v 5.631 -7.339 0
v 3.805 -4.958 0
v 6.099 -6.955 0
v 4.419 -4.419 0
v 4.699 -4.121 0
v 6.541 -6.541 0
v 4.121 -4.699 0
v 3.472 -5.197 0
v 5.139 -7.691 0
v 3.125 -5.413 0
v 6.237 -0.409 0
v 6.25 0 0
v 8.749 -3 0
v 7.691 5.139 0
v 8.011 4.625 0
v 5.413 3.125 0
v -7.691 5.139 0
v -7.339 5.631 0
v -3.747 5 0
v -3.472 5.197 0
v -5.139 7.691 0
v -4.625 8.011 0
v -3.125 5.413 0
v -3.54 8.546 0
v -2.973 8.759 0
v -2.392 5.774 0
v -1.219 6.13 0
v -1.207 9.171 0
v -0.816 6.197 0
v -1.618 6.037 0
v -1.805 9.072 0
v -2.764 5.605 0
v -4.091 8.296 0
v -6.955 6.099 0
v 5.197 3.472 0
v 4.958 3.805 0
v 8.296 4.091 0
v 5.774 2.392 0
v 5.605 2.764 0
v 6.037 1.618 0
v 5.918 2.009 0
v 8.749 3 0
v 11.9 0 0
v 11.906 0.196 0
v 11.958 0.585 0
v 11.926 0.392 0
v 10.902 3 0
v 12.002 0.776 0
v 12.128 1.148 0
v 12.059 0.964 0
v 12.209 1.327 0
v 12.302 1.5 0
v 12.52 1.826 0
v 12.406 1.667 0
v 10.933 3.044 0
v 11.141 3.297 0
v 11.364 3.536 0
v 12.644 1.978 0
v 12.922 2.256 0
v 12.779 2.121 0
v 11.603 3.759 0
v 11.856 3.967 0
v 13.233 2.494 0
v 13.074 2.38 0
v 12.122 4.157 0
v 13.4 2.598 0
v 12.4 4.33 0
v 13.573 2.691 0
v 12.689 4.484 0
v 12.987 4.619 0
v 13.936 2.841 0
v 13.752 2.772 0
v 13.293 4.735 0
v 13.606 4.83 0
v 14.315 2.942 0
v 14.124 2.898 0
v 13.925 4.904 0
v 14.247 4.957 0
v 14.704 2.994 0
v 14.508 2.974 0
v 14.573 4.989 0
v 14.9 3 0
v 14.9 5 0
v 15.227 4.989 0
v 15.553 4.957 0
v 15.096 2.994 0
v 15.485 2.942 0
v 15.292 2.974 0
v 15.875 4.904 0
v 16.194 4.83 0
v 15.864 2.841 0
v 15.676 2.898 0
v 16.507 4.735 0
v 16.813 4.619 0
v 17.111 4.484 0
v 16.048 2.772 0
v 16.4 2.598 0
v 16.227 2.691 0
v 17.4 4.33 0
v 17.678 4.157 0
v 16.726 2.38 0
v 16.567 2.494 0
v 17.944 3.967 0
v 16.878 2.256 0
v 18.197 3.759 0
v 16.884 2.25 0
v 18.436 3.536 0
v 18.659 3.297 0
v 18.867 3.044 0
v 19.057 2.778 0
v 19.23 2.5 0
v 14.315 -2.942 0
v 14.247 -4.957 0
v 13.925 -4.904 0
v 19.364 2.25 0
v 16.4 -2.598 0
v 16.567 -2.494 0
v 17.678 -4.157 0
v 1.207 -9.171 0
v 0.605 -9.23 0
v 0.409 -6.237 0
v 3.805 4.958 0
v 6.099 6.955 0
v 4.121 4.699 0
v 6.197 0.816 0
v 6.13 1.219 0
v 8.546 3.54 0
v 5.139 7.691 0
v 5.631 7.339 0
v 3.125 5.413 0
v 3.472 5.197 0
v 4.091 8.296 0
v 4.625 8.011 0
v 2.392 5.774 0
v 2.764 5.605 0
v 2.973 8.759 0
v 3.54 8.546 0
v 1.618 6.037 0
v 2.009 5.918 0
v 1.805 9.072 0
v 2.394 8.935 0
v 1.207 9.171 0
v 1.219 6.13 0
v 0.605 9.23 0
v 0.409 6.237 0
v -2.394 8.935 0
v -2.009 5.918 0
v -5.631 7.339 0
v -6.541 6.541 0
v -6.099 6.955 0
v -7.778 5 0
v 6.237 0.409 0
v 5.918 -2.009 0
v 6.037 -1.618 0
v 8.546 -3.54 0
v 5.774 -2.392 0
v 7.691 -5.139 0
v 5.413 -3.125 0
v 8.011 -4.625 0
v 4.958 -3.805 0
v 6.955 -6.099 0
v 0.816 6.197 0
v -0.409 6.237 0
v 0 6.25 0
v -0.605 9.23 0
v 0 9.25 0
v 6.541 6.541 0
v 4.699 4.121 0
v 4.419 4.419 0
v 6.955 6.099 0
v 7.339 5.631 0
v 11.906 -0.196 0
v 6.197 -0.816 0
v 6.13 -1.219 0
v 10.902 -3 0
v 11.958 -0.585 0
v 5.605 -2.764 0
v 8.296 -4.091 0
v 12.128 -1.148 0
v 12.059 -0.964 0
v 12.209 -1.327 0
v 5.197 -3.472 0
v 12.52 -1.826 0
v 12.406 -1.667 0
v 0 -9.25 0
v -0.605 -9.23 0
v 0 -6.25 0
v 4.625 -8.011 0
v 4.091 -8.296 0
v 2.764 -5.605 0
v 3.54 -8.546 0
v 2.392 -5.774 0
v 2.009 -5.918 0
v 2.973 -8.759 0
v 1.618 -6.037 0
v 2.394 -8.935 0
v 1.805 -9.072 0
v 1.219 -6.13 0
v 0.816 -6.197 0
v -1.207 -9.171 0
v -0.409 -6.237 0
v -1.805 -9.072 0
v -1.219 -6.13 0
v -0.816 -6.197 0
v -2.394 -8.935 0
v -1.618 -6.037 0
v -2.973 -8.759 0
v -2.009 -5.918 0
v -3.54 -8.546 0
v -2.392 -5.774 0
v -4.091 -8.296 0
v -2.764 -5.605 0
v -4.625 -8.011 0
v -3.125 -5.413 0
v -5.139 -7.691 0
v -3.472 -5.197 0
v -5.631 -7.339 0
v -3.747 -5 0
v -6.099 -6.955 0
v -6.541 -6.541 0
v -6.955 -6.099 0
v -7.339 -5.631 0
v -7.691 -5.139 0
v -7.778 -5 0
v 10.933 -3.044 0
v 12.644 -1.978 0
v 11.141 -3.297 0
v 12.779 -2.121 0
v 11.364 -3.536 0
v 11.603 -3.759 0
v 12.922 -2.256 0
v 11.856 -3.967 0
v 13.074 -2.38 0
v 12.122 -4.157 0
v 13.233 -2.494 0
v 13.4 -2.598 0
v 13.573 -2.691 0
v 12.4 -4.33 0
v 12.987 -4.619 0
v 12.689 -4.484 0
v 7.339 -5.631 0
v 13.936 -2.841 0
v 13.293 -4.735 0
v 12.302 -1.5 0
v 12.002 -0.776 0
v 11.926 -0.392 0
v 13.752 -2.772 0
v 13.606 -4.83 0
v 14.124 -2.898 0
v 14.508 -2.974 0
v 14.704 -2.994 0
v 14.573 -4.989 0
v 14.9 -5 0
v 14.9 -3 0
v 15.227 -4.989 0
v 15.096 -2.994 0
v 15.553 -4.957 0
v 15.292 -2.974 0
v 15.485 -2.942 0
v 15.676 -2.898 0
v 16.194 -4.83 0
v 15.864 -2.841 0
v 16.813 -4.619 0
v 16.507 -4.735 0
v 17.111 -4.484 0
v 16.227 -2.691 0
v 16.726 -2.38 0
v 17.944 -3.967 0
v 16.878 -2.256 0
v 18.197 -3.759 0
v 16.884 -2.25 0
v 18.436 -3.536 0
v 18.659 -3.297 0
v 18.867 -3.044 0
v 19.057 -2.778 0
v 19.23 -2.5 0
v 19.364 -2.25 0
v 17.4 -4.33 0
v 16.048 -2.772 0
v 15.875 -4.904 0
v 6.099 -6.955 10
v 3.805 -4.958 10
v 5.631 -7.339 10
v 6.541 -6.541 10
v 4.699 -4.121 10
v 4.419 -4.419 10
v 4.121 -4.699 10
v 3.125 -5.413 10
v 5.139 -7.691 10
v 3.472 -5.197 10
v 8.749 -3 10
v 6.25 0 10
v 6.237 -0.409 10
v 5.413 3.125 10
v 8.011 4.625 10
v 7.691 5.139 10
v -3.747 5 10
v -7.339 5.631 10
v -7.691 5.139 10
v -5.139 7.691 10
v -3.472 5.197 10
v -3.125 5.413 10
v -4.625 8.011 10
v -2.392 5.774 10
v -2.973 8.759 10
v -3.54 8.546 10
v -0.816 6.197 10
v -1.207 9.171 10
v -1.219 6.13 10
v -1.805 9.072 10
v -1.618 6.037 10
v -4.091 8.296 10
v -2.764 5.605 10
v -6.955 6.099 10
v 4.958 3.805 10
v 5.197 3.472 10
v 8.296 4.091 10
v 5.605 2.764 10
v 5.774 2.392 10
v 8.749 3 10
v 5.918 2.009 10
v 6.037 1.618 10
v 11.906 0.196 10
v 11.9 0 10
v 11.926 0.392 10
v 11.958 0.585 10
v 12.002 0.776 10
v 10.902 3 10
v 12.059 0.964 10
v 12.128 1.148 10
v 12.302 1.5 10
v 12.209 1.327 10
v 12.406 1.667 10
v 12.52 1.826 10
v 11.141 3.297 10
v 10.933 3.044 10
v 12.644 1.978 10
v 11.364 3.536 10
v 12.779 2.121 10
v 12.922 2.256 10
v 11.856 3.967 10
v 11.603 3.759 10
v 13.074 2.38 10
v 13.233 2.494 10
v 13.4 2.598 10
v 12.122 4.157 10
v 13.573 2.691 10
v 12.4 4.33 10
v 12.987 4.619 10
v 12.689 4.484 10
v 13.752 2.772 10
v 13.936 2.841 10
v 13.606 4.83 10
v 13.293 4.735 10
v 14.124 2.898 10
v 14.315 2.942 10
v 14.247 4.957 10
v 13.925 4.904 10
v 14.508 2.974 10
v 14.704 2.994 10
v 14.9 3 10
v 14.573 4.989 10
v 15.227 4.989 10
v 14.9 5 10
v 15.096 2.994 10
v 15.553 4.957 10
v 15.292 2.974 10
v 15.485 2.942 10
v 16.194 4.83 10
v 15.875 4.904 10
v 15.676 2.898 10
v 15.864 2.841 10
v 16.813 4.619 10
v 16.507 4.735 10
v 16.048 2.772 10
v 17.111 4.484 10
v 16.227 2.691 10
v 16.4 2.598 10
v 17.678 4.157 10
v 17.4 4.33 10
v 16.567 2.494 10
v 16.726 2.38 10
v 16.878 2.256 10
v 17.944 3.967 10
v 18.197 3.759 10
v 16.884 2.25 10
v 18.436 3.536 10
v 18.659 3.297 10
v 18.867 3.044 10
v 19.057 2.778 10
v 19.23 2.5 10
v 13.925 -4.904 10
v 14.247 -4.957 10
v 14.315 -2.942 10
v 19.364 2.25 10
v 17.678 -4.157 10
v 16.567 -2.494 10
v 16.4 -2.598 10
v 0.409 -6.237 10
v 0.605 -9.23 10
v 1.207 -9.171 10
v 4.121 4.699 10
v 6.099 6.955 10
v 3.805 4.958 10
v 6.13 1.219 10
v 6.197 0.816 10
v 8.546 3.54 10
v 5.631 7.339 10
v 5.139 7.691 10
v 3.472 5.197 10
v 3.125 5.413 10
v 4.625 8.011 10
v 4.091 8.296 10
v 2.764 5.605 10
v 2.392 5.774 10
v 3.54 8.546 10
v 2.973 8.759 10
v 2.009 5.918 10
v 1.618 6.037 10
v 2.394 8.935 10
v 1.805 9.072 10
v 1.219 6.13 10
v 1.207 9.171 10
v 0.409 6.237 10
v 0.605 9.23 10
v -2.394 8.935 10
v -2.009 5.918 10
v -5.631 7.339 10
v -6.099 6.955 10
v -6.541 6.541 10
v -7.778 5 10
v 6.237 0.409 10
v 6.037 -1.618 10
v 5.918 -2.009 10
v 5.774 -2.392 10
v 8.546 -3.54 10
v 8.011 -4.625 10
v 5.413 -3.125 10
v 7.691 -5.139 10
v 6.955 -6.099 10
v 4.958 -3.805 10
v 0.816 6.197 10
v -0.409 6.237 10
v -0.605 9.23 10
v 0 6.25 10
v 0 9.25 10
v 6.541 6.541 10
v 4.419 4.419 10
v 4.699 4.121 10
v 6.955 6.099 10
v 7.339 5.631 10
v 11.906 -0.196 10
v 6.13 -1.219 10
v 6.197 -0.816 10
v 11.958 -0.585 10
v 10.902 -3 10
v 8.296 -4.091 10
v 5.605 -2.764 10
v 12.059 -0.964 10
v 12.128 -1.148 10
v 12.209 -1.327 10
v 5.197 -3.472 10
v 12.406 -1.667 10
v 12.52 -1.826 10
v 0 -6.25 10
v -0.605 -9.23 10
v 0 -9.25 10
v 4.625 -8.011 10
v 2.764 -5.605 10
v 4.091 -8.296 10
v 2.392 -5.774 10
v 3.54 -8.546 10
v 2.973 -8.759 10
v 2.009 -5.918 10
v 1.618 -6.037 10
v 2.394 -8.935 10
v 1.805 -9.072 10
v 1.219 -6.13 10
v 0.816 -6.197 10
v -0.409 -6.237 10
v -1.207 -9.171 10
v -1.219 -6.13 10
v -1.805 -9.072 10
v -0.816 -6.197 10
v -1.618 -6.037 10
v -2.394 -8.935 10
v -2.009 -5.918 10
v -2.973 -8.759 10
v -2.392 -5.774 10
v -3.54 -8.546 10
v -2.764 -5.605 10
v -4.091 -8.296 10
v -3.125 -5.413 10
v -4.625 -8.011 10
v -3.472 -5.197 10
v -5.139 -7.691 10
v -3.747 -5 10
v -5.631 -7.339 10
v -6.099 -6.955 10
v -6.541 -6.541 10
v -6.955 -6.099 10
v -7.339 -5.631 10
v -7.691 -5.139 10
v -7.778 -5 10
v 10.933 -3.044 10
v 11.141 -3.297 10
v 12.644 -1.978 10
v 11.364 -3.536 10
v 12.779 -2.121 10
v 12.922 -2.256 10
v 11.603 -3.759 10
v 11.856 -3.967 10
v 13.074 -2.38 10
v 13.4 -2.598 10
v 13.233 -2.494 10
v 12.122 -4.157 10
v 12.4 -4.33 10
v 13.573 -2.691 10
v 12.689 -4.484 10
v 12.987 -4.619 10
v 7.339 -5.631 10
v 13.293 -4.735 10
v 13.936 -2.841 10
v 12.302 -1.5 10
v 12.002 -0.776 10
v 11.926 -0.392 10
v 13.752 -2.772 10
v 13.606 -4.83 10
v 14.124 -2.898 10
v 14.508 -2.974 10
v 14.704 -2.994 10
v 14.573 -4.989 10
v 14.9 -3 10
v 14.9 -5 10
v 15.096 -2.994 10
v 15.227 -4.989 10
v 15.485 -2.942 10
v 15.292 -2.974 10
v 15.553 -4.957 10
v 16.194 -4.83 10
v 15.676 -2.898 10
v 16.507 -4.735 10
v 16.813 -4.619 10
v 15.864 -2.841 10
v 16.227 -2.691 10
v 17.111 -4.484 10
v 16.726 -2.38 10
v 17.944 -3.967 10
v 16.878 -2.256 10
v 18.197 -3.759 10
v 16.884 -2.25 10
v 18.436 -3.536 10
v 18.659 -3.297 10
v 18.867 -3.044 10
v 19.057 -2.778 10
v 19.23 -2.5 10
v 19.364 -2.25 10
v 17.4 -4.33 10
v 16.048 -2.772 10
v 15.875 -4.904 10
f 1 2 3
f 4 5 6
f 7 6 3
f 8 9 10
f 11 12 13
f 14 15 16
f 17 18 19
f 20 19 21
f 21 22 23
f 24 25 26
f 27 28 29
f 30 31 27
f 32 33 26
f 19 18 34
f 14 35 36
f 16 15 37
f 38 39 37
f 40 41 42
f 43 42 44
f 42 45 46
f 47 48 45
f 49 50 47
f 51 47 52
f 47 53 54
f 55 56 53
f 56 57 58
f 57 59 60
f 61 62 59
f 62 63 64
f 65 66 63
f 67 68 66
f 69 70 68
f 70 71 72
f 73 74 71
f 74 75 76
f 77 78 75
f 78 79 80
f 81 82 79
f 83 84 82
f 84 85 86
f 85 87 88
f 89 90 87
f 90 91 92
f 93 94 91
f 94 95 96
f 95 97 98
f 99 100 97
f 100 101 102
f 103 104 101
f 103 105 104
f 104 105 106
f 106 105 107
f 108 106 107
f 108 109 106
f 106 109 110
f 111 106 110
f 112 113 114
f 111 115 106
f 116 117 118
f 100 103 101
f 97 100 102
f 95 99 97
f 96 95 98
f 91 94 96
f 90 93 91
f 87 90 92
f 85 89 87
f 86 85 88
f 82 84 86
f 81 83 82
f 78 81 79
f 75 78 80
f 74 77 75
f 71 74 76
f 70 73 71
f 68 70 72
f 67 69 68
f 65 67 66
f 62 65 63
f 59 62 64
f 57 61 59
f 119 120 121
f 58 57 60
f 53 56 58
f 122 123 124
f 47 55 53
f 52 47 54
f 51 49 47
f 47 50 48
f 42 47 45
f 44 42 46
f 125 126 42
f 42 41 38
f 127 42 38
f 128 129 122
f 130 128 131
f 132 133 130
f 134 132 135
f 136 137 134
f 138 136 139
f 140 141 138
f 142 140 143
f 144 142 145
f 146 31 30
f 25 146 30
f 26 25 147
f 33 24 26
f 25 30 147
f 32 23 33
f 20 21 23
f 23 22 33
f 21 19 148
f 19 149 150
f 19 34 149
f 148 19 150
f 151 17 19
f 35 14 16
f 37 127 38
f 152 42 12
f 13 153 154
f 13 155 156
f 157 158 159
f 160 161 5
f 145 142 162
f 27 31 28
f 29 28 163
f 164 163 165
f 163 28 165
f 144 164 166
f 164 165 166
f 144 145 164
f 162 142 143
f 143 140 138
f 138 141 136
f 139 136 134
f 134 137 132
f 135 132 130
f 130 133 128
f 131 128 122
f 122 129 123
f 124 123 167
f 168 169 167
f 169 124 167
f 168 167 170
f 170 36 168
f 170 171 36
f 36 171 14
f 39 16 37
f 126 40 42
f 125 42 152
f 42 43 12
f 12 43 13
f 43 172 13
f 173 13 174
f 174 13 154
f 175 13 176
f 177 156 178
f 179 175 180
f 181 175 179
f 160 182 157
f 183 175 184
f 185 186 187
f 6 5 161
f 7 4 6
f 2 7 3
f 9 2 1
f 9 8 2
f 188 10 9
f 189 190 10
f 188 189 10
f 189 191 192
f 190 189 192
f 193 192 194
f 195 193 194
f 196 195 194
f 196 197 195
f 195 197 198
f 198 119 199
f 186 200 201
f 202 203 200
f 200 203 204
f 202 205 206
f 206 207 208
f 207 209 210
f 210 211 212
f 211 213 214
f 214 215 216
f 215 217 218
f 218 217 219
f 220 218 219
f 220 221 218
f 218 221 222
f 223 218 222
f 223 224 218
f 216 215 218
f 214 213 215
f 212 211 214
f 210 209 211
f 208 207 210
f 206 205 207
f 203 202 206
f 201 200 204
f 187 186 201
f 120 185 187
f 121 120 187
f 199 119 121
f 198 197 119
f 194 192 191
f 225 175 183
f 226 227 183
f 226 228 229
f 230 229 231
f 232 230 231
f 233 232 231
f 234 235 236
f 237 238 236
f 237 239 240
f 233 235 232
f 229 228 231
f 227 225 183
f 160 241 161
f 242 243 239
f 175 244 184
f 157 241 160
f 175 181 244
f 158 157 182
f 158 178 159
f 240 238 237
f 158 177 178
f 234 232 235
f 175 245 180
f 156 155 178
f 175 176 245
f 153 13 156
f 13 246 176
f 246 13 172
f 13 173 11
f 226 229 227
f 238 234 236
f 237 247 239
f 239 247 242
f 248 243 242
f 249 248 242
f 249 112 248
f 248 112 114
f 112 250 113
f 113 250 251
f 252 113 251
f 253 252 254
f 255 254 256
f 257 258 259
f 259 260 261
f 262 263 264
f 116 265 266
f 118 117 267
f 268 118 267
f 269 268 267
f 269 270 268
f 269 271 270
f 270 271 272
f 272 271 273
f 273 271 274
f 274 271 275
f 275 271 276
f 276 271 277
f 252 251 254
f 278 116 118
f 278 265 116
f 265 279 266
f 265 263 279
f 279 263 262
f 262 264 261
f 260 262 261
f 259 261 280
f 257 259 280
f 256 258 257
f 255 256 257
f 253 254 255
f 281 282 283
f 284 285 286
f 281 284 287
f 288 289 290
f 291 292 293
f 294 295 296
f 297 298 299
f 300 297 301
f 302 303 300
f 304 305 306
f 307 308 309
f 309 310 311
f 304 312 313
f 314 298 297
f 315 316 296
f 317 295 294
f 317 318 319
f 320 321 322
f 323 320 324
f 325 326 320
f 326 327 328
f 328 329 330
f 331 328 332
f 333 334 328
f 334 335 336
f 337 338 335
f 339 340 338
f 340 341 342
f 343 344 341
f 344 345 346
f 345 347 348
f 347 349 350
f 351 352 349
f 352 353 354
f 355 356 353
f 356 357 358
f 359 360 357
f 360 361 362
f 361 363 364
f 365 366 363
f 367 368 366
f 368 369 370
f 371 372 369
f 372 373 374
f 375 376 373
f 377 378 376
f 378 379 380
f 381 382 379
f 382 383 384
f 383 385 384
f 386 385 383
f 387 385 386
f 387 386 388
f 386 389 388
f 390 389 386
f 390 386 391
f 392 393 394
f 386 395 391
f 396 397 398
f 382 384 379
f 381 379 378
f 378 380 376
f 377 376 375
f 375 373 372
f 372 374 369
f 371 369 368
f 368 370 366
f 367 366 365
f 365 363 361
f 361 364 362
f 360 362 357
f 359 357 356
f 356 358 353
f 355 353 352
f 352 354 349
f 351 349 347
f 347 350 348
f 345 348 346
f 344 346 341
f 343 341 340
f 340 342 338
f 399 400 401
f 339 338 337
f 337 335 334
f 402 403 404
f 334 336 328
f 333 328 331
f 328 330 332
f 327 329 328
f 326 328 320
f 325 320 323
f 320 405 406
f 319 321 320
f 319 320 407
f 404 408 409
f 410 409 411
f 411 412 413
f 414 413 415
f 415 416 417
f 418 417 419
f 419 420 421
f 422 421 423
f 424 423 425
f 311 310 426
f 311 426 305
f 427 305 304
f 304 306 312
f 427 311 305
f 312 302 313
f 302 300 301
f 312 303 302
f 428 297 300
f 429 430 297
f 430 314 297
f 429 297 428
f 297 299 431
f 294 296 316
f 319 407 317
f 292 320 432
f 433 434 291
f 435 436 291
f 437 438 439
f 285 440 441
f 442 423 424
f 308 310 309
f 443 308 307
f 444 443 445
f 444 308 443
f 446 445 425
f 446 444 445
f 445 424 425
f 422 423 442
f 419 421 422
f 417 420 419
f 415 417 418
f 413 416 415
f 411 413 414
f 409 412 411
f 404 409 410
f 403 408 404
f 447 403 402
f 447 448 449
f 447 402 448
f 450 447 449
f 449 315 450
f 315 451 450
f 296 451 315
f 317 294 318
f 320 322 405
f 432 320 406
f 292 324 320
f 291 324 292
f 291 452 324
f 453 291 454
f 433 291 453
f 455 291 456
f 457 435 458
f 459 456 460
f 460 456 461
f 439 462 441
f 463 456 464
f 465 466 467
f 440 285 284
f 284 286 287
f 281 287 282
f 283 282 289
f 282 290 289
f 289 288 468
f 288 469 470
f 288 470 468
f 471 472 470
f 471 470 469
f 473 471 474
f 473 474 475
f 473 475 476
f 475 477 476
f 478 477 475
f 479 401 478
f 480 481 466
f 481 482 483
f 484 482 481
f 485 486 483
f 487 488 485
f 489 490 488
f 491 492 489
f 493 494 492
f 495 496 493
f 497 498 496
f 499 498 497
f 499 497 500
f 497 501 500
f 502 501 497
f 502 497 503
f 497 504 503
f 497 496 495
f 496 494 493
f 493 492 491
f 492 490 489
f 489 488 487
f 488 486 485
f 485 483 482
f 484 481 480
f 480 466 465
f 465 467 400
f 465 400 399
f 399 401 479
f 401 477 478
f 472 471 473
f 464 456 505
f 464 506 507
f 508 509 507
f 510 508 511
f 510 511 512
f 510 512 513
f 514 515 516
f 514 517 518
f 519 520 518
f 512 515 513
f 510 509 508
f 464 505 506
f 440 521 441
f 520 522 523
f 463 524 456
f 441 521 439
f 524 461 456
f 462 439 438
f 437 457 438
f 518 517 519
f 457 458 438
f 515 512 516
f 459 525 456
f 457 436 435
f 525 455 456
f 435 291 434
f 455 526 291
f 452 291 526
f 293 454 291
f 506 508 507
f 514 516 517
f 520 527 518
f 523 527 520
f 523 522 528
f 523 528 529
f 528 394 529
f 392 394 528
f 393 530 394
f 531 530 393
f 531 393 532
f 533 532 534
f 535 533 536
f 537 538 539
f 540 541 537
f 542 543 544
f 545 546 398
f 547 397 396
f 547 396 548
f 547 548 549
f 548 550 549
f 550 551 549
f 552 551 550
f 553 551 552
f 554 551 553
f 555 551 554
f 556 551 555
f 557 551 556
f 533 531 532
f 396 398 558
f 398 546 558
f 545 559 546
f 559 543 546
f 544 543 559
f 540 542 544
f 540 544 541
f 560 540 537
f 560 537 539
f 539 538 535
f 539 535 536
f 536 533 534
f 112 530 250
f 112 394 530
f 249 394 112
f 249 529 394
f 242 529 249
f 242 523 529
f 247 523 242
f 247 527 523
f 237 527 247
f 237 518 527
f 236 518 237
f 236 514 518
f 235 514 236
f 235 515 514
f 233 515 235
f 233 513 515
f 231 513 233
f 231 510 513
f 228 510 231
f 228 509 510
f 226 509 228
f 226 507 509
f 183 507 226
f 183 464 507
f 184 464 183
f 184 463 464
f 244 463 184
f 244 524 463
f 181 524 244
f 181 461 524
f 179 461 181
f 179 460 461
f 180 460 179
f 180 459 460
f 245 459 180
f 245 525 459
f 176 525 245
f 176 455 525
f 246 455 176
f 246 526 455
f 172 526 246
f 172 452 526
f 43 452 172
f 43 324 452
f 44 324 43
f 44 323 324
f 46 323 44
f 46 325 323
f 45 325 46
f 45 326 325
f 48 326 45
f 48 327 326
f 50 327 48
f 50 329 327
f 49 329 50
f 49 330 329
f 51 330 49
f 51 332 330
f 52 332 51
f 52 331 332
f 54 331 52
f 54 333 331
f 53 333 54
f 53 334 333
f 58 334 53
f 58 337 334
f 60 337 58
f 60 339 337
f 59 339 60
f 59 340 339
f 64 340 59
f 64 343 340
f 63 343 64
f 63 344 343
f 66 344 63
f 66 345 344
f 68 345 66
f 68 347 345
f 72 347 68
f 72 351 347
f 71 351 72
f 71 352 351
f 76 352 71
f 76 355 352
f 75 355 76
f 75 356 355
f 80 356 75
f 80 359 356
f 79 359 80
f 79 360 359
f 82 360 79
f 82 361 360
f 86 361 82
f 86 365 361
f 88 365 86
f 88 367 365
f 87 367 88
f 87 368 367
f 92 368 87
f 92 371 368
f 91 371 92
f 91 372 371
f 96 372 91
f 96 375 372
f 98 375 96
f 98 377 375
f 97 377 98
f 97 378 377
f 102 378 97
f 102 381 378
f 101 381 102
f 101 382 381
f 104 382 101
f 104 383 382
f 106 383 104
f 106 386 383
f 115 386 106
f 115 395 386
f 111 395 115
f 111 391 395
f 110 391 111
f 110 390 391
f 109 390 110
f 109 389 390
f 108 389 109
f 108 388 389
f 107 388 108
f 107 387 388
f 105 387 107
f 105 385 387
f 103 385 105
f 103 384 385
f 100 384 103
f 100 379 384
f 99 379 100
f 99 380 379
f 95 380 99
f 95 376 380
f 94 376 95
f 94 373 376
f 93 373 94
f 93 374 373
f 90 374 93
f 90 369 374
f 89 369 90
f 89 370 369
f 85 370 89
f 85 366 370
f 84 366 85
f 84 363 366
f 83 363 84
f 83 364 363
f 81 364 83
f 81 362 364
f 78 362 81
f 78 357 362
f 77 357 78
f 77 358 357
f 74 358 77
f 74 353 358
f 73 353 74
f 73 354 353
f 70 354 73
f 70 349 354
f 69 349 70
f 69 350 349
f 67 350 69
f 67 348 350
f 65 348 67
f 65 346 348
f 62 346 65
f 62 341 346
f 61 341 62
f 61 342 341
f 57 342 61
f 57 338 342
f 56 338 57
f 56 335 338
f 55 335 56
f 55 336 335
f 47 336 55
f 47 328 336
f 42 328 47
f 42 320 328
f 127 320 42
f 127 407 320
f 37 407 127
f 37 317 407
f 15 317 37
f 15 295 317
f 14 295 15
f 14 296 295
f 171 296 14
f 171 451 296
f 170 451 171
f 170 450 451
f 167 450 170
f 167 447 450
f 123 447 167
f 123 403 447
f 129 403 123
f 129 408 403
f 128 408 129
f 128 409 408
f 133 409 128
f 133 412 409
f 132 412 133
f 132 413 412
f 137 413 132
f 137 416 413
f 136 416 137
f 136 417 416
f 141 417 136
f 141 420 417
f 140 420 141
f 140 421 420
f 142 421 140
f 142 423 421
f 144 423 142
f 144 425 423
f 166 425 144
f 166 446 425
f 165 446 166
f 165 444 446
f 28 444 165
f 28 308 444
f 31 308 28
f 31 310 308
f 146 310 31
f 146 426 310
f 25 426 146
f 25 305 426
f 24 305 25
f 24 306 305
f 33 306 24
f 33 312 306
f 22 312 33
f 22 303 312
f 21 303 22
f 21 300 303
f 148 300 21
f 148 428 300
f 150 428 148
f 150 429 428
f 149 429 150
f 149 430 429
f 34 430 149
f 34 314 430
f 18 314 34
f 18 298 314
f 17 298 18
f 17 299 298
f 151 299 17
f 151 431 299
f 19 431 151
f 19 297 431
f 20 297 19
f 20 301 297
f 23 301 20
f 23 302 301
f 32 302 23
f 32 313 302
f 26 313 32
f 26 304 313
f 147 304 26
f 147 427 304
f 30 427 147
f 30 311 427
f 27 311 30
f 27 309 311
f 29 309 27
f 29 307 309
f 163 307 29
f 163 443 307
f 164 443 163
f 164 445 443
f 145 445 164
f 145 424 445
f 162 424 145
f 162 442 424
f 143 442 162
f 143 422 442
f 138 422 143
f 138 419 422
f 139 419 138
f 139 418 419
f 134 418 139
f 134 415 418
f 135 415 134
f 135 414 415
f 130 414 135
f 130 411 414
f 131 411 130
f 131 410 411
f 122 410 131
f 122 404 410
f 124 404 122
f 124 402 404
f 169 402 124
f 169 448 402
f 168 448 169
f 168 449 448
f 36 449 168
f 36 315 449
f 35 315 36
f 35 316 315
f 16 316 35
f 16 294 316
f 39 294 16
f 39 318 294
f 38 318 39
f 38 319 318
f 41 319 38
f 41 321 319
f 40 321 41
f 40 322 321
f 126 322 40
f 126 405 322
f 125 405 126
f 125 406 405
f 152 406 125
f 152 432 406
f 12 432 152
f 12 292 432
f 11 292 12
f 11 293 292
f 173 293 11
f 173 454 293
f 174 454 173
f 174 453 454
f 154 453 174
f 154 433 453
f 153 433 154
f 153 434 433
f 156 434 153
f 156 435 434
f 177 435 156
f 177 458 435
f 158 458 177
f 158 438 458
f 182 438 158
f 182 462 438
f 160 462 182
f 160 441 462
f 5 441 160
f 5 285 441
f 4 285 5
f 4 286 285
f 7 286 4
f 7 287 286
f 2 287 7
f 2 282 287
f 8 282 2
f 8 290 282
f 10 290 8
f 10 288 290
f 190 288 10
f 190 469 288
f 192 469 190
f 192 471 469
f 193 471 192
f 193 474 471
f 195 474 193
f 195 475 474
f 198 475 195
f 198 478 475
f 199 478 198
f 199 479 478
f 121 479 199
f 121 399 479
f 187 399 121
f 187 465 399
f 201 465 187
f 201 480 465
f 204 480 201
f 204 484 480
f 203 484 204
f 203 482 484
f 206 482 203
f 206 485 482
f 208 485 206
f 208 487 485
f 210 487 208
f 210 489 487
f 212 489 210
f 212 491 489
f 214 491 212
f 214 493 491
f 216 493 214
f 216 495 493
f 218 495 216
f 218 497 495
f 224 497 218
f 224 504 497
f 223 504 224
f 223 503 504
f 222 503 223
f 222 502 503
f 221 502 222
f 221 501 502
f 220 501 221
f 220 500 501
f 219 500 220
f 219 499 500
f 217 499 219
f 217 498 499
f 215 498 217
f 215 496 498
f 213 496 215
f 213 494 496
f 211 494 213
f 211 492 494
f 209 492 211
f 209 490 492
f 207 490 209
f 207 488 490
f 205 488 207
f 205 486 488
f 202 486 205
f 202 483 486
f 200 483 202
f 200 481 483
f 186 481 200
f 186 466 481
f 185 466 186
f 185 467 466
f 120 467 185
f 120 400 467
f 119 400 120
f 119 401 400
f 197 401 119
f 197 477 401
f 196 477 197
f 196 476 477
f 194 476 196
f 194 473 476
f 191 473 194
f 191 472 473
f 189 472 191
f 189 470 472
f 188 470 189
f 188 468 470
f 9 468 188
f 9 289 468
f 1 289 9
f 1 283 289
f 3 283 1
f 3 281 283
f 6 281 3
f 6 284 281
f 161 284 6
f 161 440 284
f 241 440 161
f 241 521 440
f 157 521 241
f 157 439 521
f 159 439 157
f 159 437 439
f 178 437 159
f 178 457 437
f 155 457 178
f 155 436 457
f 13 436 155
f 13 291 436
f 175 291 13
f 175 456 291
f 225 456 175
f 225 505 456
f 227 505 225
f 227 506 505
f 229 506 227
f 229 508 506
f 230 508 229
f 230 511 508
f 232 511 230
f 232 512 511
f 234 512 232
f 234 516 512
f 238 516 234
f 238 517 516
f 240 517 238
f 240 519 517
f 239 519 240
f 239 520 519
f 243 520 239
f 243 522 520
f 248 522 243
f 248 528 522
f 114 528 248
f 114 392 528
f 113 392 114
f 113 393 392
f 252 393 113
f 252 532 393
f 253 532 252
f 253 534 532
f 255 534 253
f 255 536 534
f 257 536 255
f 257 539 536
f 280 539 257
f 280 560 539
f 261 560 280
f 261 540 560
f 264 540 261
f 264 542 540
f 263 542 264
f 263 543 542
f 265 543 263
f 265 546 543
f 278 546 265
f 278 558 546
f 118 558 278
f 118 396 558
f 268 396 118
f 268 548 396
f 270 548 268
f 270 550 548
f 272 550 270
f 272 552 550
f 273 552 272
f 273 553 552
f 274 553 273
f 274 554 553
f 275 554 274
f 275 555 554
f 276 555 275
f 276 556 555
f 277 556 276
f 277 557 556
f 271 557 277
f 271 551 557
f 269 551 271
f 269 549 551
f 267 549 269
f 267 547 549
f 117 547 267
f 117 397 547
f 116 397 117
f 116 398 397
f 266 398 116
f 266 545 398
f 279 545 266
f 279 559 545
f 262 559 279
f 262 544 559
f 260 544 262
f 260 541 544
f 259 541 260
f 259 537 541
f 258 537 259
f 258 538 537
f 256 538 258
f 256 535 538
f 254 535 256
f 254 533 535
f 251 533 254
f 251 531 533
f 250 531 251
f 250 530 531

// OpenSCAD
// Snap-on clip that holds tubing next to a 12 mm or 12.7 mm (1/2") lab stand rod
// Category: quick fixes. Two C-shaped rings joined by a bridge, extruded 10 mm.
// Measure first: stand rods are commonly 12 mm or 12.7 mm (1/2"). Set rod_id to the
// measured rod diameter minus ~0.2 mm for grip, and tube_id to the tubing's OUTER
// diameter (e.g. 8 mm ID silicone tubing is ~11 mm OD). The snap openings and the ring
// spacing follow these two numbers.
// Print: PETG (springier than PLA), flat, 0.2 mm layers, 100 % infill.
// SPDX-License-Identifier: CERN-OHL-P-2.0

/* [Clip] */
height = 10;
// measured rod diameter - 0.2 mm; opening on the -X side
rod_id = 12.5; // 0.1
rod_wall = 3;
// tubing OUTER diameter; opening on the +X side
tube_id = 6;
tube_wall = 2;

/* [Hidden] */
$fn = 96;
rod_gap = 0.8 * rod_id;                                     // snap openings
tube_gap = 0.75 * tube_id;
tube_x = rod_id / 2 + rod_wall + tube_wall + tube_id / 2 + 0.65;  // tubing ring centre
bridge = [rod_id / 2 + rod_wall - 1.35, tube_x - tube_id / 2 - tube_wall + 2, 6];  // x from, x to, width in Y

// parameter checks: stop with a message instead of building a broken part
assert(rod_wall >= 0.8 && tube_wall >= 0.8, "ring walls must be at least 0.8 mm");

module ring(id, wall) difference() { circle(d = id + 2 * wall); circle(d = id); }

linear_extrude(height)
    difference() {
        union() {
            ring(rod_id, rod_wall);
            translate([tube_x, 0]) ring(tube_id, tube_wall);
            translate([bridge[0], -bridge[2] / 2]) square([bridge[1] - bridge[0], bridge[2]]);
        }
        // snap openings, each long enough to cut through its ring whatever the sizes
        translate([-(rod_id / 2 + rod_wall + 1), -rod_gap / 2]) square([rod_id / 2 + rod_wall + 1, rod_gap]);
        translate([tube_x, -tube_gap / 2]) square([tube_id / 2 + tube_wall + 1, tube_gap]);
        circle(d = rod_id);
        translate([tube_x, 0]) circle(d = tube_id);
    }
